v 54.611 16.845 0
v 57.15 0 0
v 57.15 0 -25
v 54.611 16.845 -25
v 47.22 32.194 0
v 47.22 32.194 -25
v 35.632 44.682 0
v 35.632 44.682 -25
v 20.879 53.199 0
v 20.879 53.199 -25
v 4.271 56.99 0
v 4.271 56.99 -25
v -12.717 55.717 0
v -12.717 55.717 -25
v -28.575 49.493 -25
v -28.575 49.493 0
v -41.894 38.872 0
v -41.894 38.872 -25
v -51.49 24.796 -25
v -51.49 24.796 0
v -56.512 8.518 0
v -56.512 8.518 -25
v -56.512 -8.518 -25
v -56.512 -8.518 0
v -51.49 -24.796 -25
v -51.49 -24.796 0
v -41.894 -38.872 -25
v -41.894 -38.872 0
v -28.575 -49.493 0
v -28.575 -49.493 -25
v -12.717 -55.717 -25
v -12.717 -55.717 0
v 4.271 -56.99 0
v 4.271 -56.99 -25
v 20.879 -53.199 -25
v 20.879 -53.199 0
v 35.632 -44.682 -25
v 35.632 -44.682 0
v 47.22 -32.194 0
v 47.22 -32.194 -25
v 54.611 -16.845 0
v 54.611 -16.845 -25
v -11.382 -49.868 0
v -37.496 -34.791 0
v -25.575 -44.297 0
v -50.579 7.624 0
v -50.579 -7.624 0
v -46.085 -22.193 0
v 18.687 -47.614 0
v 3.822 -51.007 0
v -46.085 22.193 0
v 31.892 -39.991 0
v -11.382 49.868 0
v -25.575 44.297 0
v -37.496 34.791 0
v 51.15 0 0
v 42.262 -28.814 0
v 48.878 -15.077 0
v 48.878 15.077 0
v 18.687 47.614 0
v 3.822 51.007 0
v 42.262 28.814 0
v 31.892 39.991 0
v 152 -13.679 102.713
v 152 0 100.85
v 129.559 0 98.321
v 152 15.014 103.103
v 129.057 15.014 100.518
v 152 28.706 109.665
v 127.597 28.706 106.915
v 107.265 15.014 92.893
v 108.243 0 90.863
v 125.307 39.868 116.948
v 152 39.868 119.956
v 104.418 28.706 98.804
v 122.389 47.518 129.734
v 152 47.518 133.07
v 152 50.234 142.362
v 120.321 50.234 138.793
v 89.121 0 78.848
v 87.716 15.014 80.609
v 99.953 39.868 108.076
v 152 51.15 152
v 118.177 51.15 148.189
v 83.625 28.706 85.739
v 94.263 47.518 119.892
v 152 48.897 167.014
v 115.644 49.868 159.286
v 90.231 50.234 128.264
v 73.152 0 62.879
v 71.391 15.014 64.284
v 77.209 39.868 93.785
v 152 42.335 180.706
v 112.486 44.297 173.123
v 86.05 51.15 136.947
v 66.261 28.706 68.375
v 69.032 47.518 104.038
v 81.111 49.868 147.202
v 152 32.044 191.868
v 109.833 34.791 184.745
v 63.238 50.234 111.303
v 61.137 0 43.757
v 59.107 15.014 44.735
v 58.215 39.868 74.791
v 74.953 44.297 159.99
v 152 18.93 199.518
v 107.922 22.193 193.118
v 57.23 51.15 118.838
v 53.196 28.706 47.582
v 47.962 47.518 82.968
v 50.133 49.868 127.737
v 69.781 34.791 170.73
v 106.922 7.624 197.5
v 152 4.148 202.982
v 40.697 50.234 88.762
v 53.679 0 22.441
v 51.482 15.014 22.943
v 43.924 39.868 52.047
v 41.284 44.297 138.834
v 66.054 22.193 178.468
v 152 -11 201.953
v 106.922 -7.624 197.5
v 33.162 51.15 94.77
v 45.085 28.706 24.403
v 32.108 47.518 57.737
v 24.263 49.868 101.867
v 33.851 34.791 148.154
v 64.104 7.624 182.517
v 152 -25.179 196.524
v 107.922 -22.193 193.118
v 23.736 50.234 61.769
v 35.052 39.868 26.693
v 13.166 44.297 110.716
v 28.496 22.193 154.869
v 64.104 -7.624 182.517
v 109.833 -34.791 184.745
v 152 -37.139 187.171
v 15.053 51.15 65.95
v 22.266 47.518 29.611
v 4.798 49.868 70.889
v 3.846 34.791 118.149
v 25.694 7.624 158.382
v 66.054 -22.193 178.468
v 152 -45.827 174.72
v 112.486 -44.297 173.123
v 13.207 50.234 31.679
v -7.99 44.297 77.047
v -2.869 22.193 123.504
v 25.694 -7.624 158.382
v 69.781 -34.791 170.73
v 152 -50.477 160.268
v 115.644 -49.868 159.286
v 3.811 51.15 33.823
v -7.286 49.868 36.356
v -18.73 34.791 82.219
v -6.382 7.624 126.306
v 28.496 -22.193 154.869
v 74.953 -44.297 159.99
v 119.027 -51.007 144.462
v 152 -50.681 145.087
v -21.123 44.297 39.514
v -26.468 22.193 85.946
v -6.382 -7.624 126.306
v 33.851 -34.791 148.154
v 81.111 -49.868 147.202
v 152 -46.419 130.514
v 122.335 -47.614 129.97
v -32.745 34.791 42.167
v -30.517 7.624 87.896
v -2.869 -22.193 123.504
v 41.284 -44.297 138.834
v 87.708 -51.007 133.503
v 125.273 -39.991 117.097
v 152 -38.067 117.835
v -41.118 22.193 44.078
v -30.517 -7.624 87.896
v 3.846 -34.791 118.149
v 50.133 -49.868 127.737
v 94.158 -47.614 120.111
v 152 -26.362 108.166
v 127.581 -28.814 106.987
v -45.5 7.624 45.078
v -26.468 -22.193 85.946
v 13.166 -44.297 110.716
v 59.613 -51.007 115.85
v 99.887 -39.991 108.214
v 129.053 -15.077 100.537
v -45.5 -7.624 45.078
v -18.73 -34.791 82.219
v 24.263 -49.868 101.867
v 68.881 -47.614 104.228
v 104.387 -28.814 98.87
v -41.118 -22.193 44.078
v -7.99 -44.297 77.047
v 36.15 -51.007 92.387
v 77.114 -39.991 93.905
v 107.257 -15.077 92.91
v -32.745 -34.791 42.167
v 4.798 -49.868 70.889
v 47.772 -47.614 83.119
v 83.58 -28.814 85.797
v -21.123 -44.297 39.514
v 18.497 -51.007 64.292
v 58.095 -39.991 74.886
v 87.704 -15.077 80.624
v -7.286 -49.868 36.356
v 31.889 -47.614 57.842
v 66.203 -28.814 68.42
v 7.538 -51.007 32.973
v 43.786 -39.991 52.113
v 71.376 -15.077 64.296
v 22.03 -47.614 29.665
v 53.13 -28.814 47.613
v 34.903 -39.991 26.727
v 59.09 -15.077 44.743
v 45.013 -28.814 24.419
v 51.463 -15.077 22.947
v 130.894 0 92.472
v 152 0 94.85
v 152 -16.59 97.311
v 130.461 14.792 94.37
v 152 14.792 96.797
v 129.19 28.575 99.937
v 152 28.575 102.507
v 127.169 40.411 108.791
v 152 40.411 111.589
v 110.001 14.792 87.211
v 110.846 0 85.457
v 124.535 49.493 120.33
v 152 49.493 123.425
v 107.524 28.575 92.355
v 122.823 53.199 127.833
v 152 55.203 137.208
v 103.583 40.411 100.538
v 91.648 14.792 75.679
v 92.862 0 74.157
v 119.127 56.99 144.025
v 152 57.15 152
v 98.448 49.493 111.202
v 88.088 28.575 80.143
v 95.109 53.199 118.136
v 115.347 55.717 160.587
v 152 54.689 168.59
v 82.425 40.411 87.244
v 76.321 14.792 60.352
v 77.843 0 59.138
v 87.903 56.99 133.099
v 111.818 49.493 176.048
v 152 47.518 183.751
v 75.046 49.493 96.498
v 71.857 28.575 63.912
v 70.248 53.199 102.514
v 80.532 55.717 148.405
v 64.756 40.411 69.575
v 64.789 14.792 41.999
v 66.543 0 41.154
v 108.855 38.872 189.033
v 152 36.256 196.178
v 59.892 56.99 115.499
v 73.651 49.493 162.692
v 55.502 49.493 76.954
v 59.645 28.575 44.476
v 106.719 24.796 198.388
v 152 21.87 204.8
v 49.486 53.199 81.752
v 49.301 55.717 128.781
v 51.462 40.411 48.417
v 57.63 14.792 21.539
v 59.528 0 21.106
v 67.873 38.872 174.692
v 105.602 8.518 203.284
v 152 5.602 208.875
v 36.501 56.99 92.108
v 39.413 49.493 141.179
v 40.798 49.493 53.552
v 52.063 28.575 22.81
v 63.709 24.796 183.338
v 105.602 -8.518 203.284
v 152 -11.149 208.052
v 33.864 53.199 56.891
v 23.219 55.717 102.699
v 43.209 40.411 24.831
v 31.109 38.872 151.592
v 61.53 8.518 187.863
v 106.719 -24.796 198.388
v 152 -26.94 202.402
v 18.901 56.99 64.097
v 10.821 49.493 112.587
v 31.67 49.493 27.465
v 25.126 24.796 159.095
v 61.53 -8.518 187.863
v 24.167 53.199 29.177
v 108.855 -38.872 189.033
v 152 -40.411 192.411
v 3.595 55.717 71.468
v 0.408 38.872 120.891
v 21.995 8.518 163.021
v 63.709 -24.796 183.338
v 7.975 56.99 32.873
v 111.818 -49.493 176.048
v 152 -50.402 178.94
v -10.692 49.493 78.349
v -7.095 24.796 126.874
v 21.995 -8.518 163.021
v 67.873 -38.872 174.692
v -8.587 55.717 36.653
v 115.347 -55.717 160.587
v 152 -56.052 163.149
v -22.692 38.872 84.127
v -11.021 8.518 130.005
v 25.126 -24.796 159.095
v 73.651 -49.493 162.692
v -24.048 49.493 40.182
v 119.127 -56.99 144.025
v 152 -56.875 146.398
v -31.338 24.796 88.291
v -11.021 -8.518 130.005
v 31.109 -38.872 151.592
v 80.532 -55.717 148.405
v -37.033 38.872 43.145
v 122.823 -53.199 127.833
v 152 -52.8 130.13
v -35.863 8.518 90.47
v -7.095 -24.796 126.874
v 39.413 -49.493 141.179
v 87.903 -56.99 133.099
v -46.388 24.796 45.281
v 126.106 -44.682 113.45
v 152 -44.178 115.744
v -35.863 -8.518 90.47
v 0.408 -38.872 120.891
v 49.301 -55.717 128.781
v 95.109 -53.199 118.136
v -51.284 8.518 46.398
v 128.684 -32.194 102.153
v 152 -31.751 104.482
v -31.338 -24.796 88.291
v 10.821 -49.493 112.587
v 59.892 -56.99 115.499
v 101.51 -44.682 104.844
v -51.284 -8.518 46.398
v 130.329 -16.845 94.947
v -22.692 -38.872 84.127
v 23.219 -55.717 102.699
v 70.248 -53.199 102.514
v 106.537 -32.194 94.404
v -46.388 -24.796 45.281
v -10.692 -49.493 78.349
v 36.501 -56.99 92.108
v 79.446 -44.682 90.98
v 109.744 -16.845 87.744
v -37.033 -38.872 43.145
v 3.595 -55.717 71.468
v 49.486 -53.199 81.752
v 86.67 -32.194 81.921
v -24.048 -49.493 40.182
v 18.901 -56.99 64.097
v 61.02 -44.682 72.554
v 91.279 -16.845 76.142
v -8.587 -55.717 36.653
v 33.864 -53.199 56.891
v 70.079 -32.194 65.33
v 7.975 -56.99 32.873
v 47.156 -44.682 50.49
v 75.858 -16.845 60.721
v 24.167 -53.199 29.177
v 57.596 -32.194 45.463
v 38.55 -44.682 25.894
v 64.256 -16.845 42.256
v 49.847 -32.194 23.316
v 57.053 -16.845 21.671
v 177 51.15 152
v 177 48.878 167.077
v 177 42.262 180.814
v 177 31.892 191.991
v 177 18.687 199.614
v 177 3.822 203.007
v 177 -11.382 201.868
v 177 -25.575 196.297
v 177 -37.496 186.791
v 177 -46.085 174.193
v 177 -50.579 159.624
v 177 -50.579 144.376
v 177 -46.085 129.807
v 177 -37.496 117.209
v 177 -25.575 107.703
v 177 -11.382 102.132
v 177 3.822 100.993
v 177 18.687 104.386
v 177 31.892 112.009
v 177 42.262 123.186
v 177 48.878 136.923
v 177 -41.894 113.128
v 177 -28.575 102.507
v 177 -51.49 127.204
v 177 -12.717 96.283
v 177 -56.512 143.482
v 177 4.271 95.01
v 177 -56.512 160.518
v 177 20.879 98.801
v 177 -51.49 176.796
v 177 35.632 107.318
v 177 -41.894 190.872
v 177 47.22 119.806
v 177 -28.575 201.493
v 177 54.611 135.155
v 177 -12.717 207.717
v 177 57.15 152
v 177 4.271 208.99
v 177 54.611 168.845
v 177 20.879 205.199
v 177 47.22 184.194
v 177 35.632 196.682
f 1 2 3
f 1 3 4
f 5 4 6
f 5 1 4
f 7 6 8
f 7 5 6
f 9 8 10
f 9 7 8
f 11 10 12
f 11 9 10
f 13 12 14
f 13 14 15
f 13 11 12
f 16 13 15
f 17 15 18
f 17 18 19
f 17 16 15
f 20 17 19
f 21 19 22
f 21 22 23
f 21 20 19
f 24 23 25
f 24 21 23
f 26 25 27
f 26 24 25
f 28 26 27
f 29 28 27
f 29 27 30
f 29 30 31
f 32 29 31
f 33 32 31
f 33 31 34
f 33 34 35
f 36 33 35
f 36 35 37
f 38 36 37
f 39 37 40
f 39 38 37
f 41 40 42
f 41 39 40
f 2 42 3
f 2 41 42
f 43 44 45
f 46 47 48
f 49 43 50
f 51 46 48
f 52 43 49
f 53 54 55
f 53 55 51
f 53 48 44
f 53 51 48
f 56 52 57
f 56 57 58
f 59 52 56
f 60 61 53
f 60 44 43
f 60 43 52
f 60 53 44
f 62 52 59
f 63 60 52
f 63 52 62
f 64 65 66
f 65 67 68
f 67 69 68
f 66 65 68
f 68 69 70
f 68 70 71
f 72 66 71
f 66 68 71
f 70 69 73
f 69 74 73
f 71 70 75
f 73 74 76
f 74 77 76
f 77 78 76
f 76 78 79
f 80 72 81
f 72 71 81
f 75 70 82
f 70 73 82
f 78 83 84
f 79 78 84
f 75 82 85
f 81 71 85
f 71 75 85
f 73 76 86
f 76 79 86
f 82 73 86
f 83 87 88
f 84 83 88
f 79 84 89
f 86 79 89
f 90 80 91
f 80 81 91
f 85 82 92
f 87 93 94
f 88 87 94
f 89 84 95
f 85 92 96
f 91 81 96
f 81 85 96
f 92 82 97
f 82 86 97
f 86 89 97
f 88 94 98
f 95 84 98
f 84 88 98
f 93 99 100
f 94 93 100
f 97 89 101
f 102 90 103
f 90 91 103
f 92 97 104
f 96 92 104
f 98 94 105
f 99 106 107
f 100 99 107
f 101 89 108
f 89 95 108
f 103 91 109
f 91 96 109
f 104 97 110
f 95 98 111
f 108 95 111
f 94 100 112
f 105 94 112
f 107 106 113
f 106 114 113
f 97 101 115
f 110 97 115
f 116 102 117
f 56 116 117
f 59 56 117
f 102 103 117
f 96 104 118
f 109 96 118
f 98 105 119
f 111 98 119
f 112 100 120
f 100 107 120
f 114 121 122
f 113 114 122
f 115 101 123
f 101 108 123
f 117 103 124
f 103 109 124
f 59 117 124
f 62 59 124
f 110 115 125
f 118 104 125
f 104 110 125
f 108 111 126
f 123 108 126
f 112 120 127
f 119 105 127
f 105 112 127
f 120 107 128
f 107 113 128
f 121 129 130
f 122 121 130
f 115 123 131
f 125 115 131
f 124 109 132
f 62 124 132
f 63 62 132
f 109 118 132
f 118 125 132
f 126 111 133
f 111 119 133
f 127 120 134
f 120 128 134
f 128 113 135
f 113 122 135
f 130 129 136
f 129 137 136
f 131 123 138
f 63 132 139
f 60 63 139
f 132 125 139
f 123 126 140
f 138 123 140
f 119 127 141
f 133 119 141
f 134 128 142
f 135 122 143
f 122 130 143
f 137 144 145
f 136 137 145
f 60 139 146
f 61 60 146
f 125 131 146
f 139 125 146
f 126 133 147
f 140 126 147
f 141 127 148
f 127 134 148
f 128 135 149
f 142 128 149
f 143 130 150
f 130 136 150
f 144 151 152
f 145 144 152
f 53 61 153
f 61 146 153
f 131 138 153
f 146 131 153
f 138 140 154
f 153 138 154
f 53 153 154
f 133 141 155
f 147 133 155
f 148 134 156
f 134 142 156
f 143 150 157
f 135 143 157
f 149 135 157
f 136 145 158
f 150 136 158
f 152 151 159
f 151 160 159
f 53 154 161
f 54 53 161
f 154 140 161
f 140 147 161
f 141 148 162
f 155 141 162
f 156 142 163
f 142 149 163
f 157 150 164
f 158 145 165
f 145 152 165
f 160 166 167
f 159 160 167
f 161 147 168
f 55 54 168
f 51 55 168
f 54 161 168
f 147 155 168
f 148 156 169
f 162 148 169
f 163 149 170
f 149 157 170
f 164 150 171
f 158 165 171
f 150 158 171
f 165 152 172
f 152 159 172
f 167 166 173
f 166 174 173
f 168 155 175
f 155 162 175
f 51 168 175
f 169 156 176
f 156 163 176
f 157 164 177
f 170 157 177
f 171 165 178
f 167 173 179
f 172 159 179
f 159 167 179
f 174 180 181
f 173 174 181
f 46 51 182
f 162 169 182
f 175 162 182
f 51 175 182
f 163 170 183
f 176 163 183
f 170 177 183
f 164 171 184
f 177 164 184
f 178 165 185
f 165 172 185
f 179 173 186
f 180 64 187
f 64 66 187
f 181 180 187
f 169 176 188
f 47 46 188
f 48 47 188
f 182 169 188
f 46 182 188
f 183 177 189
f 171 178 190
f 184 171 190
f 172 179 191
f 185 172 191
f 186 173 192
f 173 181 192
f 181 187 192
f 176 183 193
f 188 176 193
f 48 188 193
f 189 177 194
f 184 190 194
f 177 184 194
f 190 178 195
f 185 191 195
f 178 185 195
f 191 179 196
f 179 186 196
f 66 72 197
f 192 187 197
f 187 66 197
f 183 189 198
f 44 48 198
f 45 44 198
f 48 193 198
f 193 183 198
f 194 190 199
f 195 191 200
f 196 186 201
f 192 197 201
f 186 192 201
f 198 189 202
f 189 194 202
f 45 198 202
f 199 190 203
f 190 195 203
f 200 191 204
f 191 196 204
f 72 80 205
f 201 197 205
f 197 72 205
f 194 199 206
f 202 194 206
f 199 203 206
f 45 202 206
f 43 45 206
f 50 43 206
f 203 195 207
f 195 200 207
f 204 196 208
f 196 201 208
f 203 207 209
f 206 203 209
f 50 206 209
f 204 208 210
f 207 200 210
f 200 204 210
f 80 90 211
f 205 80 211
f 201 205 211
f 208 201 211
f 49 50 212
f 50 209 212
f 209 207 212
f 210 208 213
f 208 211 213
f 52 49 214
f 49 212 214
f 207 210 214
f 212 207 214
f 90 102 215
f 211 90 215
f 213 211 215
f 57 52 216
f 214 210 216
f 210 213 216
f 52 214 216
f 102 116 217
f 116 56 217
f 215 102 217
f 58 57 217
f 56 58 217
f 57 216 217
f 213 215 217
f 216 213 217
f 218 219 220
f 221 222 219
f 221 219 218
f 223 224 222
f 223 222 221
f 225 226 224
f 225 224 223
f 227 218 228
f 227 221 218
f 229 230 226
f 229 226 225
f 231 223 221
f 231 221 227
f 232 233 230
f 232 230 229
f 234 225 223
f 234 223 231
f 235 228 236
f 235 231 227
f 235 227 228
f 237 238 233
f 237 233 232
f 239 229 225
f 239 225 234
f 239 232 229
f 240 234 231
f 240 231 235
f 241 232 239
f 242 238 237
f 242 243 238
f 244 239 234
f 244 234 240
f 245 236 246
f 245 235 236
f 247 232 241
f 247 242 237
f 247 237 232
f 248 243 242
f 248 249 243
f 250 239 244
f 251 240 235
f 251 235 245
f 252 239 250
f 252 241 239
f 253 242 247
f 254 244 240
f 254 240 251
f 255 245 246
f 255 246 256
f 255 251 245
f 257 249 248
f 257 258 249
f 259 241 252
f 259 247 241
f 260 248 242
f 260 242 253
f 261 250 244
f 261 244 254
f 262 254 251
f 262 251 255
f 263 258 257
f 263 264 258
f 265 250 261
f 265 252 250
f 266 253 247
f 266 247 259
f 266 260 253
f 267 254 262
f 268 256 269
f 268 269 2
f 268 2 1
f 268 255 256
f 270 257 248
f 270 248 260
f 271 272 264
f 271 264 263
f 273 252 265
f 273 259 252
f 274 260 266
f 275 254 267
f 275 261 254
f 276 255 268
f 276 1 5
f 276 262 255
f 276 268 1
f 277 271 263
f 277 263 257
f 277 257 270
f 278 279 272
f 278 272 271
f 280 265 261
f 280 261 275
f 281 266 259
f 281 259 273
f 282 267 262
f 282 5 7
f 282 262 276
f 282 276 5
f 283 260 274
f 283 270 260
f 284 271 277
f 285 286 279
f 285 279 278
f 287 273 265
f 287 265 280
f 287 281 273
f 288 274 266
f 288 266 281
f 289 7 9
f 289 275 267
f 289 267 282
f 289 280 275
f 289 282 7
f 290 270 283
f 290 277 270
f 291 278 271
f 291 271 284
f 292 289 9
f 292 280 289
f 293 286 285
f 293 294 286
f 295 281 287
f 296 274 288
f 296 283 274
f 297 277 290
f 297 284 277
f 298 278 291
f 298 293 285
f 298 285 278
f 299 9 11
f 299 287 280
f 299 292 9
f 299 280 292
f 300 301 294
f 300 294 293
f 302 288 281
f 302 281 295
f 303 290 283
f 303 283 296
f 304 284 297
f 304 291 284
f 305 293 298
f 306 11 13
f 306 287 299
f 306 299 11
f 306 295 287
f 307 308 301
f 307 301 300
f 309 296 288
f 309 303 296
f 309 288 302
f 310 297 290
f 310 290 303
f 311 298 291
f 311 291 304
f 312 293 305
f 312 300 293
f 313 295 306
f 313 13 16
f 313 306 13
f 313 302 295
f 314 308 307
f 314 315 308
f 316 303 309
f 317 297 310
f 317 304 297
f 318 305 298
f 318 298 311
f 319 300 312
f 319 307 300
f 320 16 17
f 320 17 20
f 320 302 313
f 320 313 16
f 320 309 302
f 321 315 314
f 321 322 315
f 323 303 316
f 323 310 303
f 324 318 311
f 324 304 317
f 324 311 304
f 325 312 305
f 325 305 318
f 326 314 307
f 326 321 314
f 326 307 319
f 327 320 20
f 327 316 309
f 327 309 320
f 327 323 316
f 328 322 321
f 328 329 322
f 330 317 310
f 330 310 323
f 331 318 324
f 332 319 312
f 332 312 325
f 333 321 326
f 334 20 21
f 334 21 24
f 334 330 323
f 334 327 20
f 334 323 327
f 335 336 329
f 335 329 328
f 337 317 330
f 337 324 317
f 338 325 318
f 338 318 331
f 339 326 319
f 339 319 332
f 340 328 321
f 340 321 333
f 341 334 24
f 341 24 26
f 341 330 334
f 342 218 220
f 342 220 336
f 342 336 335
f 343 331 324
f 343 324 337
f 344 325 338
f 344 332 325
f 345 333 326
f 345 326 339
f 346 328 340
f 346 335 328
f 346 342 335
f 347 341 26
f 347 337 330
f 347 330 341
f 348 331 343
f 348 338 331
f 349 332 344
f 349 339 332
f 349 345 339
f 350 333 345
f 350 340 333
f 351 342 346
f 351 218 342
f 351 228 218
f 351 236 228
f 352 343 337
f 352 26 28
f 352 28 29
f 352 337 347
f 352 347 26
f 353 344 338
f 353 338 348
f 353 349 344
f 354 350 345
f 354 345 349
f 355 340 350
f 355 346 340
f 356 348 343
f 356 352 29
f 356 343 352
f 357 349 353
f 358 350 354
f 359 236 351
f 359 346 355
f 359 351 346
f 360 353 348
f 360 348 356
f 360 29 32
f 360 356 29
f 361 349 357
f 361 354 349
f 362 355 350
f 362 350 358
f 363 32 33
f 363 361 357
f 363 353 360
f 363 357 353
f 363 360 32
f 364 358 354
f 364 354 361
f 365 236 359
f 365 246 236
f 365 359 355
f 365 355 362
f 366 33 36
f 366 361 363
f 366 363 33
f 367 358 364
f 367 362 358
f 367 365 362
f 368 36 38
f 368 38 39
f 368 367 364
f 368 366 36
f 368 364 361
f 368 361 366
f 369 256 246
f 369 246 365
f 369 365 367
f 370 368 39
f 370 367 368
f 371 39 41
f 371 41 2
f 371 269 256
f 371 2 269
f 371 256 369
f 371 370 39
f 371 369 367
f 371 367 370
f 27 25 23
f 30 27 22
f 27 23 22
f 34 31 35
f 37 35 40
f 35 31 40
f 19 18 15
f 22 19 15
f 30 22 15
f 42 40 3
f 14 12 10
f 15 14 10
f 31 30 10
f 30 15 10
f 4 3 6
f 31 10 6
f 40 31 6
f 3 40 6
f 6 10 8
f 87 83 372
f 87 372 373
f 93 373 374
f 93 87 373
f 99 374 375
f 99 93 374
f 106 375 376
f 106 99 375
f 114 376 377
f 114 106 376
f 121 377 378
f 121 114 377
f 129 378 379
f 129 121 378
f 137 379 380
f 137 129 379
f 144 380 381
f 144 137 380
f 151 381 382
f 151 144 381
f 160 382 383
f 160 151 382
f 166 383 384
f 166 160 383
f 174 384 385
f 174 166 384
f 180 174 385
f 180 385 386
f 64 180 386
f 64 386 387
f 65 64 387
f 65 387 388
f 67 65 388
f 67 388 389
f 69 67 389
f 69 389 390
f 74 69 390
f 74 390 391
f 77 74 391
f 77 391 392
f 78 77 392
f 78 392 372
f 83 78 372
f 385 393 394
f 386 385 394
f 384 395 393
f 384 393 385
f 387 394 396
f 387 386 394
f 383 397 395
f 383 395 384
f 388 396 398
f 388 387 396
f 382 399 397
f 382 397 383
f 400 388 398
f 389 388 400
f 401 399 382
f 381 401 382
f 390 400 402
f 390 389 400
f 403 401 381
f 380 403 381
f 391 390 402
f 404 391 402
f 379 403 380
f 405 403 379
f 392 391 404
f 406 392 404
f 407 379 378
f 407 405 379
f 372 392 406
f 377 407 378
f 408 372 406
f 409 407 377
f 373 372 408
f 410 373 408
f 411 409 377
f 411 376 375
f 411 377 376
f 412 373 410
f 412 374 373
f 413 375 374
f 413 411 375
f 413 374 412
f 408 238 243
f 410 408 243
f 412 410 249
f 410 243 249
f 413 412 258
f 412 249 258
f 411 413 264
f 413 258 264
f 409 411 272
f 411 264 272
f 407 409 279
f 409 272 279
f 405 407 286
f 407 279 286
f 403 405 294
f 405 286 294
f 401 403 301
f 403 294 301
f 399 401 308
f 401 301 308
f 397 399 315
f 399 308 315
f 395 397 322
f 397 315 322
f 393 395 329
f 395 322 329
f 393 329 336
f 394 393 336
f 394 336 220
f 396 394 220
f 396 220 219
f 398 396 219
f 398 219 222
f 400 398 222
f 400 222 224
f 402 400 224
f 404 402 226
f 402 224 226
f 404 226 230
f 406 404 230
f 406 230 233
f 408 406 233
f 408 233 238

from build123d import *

# Parameters (mm, degrees)
F0_R     = 57.15
F3_T     = -6
F4_DEPTH = 25
F5_R     = 57.15
F5_R_2   = 51.15
F6_DEPTH = 25


with BuildPart() as f2:
    # F2: sweep along a path in F1
    with BuildLine(Plane.XZ) as f2_path:
        ThreePointArc((152, 152), (44.5197692596, 107.4802307404), (0, 0))
    # F0 (on Top) → F2 (sweep)
    with BuildSketch(Plane.XY):
        Circle(F0_R)
    sweep(path=f2_path.line)

    # F3
    f3_openings = [f2.faces().sort_by_distance(p)[0] for p in [
        (152, 0, 152),
        (0, 0, 0),
    ]]
    offset(amount=F3_T, openings=f3_openings, kind=Kind.INTERSECTION)

    # F0 (on Top) → F4 (join)
    with BuildSketch(Plane.XY):
        Circle(F0_R)
    extrude(amount=-F4_DEPTH)

    # F5 (on face) → F6 (join)
    with BuildSketch(Plane.YZ.offset(152)):
        with Locations((0, 152)):
            Circle(F5_R)
        with Locations((0, 152)):
            Circle(F5_R_2, mode=Mode.SUBTRACT)
    extrude(amount=F6_DEPTH)


solid = f2.part
